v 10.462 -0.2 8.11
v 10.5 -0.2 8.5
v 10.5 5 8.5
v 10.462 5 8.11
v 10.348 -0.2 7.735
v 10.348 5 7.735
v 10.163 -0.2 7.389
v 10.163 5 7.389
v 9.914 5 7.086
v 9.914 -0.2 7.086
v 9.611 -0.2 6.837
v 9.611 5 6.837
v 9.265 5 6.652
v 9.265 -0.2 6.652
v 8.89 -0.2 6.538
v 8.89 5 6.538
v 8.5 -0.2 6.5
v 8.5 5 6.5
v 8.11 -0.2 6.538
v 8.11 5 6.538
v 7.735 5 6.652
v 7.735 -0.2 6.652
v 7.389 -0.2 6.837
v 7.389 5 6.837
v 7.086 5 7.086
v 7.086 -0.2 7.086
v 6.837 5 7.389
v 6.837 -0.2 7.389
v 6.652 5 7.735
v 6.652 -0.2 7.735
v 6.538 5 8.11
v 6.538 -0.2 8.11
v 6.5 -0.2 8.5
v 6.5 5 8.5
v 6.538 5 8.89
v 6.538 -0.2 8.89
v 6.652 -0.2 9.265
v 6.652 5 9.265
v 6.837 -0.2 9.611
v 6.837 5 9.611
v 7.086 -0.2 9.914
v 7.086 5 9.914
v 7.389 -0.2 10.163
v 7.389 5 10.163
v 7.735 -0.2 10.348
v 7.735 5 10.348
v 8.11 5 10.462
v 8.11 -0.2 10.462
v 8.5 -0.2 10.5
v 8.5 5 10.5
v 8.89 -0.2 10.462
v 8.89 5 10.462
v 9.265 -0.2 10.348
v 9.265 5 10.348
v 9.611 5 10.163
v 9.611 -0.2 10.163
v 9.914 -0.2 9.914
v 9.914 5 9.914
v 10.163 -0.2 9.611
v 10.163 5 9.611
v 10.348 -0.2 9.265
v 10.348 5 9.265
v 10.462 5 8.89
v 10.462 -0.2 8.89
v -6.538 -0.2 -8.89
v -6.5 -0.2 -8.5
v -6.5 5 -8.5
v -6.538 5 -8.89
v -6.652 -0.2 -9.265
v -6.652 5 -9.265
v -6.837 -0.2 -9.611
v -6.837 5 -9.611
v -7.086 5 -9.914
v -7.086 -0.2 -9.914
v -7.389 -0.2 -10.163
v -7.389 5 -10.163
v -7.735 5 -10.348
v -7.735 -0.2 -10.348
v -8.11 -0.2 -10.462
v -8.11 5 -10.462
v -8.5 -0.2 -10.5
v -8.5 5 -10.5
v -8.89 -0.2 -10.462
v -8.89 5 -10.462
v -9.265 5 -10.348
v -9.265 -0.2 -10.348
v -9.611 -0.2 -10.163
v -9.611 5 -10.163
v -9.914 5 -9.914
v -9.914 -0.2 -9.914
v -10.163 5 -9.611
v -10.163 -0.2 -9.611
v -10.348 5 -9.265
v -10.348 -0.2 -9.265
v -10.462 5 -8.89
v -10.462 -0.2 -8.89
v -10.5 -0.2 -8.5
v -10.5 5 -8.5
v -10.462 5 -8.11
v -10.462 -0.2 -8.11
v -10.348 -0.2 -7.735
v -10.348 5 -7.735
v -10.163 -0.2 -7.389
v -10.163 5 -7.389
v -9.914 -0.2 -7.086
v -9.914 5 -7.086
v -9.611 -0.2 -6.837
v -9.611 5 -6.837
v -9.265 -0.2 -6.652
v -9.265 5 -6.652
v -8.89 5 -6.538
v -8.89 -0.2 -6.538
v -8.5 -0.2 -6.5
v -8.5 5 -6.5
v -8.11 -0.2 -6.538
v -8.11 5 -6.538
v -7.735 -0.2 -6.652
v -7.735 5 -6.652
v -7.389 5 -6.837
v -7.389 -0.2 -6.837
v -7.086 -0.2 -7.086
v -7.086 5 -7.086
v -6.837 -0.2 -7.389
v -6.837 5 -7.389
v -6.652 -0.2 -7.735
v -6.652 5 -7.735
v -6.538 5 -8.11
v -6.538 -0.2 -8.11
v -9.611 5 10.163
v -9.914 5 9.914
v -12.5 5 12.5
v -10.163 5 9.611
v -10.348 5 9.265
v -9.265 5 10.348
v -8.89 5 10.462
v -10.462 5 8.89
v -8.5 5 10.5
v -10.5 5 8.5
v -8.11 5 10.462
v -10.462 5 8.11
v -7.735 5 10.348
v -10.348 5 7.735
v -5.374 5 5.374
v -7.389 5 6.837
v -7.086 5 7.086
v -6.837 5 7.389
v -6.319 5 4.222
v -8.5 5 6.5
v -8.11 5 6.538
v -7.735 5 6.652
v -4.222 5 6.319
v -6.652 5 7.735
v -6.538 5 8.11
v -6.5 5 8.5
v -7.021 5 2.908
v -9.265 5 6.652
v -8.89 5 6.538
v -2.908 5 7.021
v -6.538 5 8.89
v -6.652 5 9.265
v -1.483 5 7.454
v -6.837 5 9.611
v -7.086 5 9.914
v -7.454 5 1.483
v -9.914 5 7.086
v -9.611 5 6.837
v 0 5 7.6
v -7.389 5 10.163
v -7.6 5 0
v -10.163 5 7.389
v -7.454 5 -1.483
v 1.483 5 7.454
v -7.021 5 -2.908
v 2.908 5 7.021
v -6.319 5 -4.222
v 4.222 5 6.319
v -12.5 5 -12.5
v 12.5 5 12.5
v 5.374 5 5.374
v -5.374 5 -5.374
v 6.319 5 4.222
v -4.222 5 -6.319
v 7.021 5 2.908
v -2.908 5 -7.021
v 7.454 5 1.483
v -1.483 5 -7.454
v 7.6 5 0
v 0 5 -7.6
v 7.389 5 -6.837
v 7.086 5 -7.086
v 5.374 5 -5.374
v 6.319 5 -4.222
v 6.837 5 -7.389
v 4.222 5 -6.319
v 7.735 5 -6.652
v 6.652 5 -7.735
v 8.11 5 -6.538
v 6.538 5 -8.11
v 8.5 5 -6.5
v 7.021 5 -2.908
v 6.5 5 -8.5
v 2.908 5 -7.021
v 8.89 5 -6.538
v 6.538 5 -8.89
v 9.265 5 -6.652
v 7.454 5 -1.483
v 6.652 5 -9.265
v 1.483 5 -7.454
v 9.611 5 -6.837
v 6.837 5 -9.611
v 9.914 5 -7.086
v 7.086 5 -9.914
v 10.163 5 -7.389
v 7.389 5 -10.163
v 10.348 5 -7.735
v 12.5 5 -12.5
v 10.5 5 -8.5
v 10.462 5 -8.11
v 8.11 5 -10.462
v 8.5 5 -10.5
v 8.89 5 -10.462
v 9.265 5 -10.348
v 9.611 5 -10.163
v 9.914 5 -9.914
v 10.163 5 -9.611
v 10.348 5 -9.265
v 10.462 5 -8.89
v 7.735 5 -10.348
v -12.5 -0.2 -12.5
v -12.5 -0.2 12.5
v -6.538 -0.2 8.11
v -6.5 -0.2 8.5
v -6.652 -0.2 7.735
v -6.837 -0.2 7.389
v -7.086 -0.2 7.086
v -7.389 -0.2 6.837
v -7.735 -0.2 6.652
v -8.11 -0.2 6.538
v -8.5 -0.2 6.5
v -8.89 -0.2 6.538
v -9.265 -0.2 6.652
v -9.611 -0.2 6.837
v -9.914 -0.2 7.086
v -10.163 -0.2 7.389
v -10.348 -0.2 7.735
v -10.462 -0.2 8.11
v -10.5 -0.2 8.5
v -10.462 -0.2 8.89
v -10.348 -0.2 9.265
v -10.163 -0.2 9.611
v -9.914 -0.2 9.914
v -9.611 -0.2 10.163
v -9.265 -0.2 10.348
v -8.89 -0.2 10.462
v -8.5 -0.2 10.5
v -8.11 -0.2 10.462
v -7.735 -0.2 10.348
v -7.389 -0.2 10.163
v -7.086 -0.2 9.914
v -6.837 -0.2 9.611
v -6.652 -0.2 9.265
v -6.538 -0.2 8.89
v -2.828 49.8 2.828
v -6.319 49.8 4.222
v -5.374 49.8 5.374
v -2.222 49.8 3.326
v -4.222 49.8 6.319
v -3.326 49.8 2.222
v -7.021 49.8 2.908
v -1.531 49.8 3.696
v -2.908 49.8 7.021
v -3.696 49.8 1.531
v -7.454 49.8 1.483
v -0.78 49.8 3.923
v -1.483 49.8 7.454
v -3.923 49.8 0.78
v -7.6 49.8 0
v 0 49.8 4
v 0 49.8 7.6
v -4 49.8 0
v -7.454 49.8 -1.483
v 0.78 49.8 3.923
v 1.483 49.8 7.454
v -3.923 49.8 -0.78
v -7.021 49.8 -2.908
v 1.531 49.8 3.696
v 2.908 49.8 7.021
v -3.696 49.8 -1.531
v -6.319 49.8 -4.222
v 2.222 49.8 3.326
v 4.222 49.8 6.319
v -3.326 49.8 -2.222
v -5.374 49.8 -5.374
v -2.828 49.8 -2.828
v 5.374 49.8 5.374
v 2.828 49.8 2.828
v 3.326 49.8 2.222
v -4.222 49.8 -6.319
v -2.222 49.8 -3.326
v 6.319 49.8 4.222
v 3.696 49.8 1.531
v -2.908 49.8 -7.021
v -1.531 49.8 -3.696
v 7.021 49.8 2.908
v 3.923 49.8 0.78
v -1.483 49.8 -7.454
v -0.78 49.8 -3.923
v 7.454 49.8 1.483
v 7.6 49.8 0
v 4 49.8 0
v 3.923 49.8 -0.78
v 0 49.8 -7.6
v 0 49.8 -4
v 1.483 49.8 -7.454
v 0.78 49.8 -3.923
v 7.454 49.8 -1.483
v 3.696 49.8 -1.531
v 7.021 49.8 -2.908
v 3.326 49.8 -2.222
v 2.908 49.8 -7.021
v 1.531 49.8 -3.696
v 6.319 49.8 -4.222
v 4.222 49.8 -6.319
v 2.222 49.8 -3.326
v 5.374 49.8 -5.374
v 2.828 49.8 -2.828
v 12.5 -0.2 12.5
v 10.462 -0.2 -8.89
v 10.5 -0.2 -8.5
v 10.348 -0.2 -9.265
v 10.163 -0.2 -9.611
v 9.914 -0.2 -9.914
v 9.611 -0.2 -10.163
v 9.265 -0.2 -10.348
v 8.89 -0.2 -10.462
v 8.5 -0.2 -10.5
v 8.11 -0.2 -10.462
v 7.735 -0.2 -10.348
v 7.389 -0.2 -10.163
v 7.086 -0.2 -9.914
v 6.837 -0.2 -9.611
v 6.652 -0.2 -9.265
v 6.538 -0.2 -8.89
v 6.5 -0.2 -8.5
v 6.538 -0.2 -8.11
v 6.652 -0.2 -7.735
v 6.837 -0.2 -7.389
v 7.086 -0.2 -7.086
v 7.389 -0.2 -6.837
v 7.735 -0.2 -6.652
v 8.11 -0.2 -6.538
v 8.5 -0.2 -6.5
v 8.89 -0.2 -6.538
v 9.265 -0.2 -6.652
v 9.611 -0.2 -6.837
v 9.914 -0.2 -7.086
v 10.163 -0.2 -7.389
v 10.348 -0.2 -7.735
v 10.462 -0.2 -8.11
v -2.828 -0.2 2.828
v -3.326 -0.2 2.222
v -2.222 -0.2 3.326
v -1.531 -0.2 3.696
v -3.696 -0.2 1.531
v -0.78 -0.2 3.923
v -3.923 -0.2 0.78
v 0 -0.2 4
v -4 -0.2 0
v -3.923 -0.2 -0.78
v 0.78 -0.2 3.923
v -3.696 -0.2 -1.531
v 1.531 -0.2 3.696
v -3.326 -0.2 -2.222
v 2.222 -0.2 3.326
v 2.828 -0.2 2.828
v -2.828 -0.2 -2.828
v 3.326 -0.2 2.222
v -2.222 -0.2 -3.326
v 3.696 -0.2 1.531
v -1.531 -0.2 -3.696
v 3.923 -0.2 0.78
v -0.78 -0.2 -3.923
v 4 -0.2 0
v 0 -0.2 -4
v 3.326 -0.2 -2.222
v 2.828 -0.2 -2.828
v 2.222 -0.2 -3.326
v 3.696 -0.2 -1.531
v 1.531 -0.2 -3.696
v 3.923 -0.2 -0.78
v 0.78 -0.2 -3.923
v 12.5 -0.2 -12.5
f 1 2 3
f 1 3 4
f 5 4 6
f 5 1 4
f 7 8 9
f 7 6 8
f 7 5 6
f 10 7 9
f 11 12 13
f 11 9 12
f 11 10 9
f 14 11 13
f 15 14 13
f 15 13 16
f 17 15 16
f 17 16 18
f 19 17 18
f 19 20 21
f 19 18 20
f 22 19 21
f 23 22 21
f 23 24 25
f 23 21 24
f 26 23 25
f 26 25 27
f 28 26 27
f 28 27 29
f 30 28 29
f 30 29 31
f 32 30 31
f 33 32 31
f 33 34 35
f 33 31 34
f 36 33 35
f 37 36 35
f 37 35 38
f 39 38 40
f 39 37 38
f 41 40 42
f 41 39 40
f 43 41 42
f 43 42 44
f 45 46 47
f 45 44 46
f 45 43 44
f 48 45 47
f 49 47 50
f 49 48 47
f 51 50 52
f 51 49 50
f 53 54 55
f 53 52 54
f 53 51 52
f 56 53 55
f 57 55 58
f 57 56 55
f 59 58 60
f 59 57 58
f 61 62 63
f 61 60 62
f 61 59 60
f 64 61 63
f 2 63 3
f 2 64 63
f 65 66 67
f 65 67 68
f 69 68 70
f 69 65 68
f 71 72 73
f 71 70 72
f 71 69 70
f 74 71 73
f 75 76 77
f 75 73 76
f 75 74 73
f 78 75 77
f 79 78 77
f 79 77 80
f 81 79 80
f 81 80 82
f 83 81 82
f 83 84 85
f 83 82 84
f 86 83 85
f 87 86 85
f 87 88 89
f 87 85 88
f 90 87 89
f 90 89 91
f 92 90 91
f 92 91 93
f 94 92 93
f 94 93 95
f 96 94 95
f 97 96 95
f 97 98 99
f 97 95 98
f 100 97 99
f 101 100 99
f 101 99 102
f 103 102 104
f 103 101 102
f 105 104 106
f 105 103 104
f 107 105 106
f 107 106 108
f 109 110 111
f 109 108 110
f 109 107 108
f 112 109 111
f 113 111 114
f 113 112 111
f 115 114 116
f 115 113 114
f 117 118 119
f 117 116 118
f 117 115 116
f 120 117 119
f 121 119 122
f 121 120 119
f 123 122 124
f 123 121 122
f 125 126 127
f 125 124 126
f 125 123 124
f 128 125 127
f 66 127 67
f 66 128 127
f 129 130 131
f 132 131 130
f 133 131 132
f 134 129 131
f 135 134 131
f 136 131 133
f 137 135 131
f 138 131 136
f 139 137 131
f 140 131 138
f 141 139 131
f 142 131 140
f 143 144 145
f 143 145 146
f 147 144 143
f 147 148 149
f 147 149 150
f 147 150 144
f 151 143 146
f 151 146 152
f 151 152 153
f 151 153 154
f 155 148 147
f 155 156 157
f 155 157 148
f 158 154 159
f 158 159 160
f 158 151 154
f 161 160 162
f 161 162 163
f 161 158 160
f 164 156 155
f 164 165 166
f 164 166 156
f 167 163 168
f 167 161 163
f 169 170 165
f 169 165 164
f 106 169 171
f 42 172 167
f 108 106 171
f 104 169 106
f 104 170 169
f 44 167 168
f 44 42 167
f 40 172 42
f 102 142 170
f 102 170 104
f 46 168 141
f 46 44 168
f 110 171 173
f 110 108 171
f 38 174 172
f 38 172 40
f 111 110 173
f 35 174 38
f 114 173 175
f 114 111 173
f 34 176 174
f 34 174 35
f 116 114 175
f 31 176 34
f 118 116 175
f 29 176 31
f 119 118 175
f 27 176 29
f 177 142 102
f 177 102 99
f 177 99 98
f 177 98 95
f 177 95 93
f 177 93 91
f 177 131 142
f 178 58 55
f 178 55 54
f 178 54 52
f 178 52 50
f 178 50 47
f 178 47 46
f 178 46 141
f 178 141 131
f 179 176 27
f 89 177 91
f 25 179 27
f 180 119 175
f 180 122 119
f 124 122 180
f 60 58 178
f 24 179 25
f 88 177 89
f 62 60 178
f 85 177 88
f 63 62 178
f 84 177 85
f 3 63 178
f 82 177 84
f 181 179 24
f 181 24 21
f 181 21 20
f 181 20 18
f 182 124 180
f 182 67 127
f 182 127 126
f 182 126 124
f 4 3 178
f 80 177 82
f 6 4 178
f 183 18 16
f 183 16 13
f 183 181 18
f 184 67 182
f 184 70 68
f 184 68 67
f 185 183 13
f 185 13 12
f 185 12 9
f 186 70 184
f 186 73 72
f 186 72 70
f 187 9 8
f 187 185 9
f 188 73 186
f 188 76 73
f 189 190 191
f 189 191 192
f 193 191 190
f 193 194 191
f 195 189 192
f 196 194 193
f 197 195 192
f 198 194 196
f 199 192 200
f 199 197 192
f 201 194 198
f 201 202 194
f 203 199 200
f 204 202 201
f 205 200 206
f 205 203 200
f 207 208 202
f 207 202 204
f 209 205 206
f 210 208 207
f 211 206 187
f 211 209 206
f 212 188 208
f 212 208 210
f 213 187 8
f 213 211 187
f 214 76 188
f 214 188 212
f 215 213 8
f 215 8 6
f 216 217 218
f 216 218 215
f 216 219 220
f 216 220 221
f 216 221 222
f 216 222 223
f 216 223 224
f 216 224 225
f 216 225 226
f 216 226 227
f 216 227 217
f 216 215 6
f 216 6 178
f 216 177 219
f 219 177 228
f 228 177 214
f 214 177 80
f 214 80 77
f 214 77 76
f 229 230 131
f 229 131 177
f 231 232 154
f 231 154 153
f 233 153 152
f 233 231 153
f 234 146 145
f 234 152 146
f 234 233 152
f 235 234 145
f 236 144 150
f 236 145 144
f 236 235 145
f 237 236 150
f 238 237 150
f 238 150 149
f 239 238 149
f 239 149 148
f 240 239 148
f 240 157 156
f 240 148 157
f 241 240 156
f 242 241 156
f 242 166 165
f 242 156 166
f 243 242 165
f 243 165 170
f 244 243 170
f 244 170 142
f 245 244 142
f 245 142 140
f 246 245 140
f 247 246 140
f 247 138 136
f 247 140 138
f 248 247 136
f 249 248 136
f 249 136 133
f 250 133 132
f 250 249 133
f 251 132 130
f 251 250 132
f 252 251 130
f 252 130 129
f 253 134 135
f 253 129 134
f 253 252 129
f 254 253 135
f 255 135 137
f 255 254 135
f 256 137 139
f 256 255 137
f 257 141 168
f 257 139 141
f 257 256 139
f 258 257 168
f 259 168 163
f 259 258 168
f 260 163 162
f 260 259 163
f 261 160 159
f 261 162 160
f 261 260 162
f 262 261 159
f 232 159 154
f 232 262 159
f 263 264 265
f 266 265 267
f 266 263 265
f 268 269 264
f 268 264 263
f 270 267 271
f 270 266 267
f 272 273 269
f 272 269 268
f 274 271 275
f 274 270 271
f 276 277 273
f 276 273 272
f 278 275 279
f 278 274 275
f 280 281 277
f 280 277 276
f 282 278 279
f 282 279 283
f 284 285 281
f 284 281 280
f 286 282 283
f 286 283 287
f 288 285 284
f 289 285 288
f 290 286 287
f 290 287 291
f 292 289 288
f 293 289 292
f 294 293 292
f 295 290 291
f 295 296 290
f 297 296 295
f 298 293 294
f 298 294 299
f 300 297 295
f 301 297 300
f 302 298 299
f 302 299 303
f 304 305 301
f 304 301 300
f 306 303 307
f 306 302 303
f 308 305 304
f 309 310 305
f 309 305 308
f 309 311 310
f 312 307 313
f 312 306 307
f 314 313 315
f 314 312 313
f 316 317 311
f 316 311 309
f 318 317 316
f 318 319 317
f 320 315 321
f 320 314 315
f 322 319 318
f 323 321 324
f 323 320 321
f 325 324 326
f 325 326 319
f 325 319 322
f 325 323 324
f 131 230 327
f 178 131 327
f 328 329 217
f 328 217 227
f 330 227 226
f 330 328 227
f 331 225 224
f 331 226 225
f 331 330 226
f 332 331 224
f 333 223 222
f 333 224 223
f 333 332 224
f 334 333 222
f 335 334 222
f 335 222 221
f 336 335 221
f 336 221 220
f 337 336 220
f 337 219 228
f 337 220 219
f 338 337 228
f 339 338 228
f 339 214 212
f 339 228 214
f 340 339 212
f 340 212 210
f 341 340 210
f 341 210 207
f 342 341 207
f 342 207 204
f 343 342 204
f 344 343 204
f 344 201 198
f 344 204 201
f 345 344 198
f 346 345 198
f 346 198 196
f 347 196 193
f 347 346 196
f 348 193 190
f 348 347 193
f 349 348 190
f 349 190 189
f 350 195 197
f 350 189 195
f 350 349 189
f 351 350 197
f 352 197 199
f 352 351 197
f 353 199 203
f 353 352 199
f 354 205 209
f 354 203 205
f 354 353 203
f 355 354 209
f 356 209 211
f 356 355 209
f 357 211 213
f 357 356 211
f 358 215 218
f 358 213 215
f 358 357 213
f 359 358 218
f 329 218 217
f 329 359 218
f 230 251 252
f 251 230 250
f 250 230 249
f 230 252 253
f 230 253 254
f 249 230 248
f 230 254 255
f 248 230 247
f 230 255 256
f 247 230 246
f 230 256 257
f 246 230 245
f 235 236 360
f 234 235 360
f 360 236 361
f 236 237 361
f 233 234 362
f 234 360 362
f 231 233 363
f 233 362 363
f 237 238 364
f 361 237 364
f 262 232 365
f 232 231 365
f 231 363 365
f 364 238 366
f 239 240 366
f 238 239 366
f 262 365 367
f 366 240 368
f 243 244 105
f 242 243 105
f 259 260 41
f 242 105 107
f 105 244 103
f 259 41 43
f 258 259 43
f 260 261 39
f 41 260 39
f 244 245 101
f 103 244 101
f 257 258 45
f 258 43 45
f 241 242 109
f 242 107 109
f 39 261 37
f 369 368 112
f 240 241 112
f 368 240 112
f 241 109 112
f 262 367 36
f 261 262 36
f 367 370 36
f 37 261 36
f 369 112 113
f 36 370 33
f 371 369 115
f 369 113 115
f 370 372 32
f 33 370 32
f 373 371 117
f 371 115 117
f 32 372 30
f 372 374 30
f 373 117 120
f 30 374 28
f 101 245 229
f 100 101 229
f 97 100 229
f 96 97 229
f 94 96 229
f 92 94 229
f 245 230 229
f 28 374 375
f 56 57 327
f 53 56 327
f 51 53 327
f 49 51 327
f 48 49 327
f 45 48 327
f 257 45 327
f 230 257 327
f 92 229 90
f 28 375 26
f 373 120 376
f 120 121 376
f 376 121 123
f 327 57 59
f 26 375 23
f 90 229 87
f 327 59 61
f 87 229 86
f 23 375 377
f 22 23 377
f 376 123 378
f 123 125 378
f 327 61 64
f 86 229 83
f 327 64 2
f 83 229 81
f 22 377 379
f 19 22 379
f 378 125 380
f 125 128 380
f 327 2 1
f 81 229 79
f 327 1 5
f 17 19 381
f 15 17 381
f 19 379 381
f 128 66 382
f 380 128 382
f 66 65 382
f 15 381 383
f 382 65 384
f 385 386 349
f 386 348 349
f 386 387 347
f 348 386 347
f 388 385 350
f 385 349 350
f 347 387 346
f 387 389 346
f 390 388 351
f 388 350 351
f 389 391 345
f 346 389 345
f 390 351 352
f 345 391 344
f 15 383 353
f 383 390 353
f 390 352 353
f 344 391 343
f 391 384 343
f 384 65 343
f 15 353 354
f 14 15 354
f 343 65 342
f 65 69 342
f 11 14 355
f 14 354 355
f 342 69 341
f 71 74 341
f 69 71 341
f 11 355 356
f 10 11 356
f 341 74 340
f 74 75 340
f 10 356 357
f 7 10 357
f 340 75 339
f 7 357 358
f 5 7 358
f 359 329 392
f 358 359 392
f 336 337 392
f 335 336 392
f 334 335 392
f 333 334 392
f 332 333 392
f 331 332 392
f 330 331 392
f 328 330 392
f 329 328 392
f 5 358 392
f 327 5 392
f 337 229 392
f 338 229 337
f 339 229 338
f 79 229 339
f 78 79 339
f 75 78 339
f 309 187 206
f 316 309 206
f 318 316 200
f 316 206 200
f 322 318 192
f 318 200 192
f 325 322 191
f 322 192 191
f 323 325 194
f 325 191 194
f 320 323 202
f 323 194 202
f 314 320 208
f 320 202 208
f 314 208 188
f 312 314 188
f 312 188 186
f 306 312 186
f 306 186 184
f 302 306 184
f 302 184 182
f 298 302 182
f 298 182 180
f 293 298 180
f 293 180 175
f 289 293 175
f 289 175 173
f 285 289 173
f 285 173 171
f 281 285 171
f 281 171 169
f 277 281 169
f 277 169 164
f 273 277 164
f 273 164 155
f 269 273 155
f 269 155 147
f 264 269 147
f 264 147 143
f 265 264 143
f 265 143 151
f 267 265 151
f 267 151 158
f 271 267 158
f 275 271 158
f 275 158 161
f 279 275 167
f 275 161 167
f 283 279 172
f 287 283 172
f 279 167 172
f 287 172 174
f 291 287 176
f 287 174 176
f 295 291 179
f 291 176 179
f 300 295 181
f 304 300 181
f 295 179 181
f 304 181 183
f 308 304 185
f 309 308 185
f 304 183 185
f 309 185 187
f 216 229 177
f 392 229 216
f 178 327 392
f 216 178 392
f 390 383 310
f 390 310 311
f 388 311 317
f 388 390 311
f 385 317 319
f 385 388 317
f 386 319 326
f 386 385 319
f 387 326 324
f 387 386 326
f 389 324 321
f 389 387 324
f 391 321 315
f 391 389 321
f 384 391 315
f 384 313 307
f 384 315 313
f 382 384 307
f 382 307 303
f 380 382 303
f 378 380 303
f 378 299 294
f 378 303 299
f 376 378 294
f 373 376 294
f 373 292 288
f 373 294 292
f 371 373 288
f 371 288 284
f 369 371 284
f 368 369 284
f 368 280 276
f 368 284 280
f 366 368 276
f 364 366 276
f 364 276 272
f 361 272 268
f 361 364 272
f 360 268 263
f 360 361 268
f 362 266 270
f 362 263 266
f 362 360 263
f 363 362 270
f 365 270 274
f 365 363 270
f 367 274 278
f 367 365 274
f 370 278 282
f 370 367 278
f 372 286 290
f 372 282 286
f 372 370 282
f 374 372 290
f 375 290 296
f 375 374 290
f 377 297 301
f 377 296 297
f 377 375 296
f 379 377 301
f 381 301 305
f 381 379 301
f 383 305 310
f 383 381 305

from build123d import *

# Parameters (mm, degrees)
CYLINDER006_R          = 2
CYLINDER006_DEPTH      = 10
CYLINDER007_R          = 2
CYLINDER007_DEPTH      = 10
CYLINDER005_R          = 2
CYLINDER005_DEPTH      = 10
CYLINDER004_R          = 2
CYLINDER004_DEPTH      = 10
CYLINDER003_R          = 4
CYLINDER003_DEPTH      = 60
CYLINDER002_R          = 7.6
CYLINDER002_DEPTH      = 45
BOX_W                  = 25
BOX_H                  = 25
BOX_DEPTH              = 5.2
CUT004_PLACEMENT_ANGLE = 90


with BuildPart() as cylinder006:
    # Cylinder006 → Cylinder006 (new body)
    with BuildSketch(Plane(origin=(21, 21, -2), x_dir=(1, 0, 0), z_dir=(0, 0, 1))):
        Circle(CYLINDER006_R)
    extrude(amount=CYLINDER006_DEPTH)


with BuildPart() as cylinder007:
    # Cylinder007 → Cylinder007 (new body)
    with BuildSketch(Plane(origin=(21, 4, -2), x_dir=(1, 0, 0), z_dir=(0, 0, 1))):
        Circle(CYLINDER007_R)
    extrude(amount=CYLINDER007_DEPTH)


with BuildPart() as cylinder005:
    # Cylinder005 → Cylinder005 (new body)
    with BuildSketch(Plane(origin=(4, 21, -2), x_dir=(1, 0, 0), z_dir=(0, 0, 1))):
        Circle(CYLINDER005_R)
    extrude(amount=CYLINDER005_DEPTH)


with BuildPart() as cylinder004:
    # Cylinder004 → Cylinder004 (new body)
    with BuildSketch(Plane(origin=(4, 4, -2), x_dir=(1, 0, 0), z_dir=(0, 0, 1))):
        Circle(CYLINDER004_R)
    extrude(amount=CYLINDER004_DEPTH)


with BuildPart() as cylinder003:
    # Cylinder003 → Cylinder003 (new body)
    with BuildSketch(Plane(origin=(12.5, 12.5, -7), x_dir=(1, 0, 0), z_dir=(0, 0, 1))):
        Circle(CYLINDER003_R)
    extrude(amount=CYLINDER003_DEPTH)


with BuildPart() as cylinder002:
    # Cylinder002 → Cylinder002 (new body)
    with BuildSketch(Plane(origin=(12.5, 12.5, 5), x_dir=(1, 0, 0), z_dir=(0, 0, 1))):
        Circle(CYLINDER002_R)
    extrude(amount=CYLINDER002_DEPTH)


with BuildPart() as cut004:
    # Box → Box (new body)
    with BuildSketch(Plane.XY):
        with Locations((12.5, 12.5)):
            Rectangle(BOX_W, BOX_H)
    extrude(amount=BOX_DEPTH)

    # Fusion: union Cylinder002
    add(cylinder002.part)

    # Cut: cut Cylinder003
    add(cylinder003.part, mode=Mode.SUBTRACT)

    # Cut001: cut Cylinder004
    add(cylinder004.part, mode=Mode.SUBTRACT)

    # Cut002: cut Cylinder005
    add(cylinder005.part, mode=Mode.SUBTRACT)

    # Cut003: cut Cylinder007
    add(cylinder007.part, mode=Mode.SUBTRACT)

    # Cut004: cut Cylinder006
    add(cylinder006.part, mode=Mode.SUBTRACT)


with BuildPart() as cut004_1:
    # Cut004 placement: moved
    add(cut004.part.moved(Location((-12.5, -0.2, 12.5))).rotate(Axis((-12.5, -0.2, 12.5), (-1, 0, 0)), CUT004_PLACEMENT_ANGLE))


solid = cut004_1.part
